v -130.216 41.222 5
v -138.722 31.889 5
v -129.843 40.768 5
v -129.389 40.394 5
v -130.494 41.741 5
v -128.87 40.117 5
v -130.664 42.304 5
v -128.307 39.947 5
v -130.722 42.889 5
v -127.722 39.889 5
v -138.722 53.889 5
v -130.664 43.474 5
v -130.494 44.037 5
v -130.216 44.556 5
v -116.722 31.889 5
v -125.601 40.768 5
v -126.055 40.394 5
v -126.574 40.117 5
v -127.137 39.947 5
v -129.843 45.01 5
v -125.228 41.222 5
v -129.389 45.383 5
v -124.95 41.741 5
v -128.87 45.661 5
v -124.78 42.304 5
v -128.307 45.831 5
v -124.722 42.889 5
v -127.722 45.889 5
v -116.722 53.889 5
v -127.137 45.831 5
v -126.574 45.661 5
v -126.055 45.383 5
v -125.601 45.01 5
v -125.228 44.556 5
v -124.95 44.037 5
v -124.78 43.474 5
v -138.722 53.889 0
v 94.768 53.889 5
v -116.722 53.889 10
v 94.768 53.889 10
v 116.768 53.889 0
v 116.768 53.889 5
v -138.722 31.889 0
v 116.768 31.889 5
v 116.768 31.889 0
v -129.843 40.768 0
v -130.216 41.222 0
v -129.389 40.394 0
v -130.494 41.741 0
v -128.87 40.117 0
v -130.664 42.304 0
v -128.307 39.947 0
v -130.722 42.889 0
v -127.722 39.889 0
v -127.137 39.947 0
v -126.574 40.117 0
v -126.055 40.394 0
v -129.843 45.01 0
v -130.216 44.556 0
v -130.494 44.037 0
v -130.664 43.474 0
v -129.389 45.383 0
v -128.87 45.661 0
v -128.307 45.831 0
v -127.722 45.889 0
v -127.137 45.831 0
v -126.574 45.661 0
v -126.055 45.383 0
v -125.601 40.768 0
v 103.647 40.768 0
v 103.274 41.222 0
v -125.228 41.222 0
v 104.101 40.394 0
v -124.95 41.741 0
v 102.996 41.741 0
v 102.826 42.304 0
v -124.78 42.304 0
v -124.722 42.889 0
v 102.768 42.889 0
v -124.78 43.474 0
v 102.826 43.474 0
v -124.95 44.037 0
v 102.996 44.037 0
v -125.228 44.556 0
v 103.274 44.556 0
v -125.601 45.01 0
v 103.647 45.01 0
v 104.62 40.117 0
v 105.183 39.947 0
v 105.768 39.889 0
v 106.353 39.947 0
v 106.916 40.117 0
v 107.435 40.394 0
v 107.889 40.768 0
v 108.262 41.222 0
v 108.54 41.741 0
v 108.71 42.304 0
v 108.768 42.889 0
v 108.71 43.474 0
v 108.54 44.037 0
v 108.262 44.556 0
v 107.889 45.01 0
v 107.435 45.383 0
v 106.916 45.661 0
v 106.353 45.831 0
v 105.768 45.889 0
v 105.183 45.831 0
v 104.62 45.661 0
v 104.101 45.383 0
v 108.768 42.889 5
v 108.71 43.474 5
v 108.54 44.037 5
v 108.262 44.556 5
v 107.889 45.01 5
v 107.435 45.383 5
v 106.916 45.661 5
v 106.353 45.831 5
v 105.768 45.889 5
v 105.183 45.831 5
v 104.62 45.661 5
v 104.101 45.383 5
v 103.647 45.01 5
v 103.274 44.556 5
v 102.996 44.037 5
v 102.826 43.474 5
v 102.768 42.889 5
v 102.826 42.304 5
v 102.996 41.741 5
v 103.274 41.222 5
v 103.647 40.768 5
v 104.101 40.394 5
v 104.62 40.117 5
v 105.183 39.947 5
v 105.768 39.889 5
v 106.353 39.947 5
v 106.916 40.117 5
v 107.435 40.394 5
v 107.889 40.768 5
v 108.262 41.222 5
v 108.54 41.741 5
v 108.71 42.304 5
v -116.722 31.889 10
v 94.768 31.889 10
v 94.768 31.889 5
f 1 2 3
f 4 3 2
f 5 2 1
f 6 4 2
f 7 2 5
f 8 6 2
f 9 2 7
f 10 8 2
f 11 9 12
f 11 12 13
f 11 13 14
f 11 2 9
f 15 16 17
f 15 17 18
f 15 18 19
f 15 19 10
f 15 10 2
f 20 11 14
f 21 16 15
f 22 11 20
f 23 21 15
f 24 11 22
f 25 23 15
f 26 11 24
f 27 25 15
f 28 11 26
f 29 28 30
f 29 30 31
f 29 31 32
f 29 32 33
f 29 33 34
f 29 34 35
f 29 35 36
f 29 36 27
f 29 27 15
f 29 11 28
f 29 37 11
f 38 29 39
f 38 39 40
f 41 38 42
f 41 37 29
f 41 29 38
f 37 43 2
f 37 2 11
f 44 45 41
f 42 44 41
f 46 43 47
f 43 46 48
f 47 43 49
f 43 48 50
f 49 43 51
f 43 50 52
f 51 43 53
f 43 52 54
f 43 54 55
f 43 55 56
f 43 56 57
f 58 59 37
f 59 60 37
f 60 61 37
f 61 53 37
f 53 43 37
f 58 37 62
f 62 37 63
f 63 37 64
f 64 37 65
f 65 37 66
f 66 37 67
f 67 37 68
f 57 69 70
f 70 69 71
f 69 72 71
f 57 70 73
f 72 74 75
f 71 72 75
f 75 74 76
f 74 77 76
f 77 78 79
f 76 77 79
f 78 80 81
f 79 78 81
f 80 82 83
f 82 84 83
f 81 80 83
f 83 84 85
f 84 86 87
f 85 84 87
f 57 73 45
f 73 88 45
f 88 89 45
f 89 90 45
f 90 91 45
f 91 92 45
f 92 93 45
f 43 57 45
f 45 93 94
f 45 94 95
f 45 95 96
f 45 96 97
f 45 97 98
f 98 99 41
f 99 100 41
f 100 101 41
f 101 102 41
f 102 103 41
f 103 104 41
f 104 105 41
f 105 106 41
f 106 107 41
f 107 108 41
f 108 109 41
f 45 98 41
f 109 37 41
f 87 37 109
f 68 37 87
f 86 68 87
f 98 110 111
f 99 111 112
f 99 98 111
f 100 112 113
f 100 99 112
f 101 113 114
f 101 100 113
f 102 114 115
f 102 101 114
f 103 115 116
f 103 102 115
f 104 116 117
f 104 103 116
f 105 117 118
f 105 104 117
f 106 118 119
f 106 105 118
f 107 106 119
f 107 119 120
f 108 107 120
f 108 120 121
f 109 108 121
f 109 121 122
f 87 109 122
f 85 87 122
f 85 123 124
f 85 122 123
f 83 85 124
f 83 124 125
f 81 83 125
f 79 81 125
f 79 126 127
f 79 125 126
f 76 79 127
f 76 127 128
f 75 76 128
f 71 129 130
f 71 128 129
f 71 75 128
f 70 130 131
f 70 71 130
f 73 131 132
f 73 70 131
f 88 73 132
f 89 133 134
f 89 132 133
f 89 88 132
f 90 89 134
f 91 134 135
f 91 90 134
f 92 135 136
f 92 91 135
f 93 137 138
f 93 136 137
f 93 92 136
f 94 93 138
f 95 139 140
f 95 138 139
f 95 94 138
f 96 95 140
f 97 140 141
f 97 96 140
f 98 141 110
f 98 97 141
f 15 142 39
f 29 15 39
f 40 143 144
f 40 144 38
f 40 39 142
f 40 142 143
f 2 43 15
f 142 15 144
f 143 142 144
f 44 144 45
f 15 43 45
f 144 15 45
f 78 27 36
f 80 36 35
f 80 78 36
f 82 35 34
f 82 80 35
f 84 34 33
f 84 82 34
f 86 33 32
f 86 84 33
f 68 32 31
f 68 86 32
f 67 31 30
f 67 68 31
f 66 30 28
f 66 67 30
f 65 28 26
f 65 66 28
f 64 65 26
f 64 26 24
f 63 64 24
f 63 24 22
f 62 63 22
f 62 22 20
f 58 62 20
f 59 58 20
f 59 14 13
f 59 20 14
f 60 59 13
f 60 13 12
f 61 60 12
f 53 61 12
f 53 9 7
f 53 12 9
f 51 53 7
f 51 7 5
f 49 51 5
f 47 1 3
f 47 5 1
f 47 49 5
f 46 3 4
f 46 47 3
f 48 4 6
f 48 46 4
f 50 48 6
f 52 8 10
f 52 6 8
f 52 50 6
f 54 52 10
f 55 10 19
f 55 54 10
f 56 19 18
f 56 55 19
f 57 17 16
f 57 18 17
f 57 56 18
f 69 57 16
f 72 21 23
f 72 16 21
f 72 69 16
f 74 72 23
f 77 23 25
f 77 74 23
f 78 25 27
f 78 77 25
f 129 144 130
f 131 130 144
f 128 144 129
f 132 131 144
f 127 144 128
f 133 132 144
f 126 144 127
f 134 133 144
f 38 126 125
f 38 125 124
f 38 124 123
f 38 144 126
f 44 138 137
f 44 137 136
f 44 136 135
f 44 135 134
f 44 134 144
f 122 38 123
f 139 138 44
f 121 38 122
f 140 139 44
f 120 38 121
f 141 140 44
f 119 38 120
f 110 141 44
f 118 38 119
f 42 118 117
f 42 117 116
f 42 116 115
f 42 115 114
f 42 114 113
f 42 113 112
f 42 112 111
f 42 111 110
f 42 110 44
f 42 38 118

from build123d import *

# Parameters (mm, degrees)
ESQUISSE1_W             = 255.49
ESQUISSE1_H             = 22
ESQUISSE1_R             = 3
BOSS_EXTRU_1_DEPTH      = 10
ESQUISSE2_W             = 22
ESQUISSE2_H             = 22
ENL_V_MAT_EXTRU_1_DEPTH = 5


with BuildPart() as part:
    # Esquisse1 → Boss.-Extru.1 (new body)
    with BuildSketch(Plane.XY):
        with Locations((-10.977028198, 42.888888889)):
            Rectangle(ESQUISSE1_W, ESQUISSE1_H)
        with Locations((-127.722028198, 42.888888889)):
            Circle(ESQUISSE1_R, mode=Mode.SUBTRACT)
        with Locations((105.767971802, 42.888888889)):
            Circle(ESQUISSE1_R, mode=Mode.SUBTRACT)
    extrude(amount=BOSS_EXTRU_1_DEPTH)

    # Esquisse2 → Enlèv. mat.-Extru.1 (cut)
    with BuildSketch(Plane.XY.offset(10)):
        with Locations((-127.722028198, 42.888888889)):
            Rectangle(ESQUISSE2_W, ESQUISSE2_H)
        with Locations((105.767971802, 42.888888889)):
            Rectangle(ESQUISSE2_W, ESQUISSE2_H)
    extrude(amount=-ENL_V_MAT_EXTRU_1_DEPTH, mode=Mode.SUBTRACT)


solid = part.part
